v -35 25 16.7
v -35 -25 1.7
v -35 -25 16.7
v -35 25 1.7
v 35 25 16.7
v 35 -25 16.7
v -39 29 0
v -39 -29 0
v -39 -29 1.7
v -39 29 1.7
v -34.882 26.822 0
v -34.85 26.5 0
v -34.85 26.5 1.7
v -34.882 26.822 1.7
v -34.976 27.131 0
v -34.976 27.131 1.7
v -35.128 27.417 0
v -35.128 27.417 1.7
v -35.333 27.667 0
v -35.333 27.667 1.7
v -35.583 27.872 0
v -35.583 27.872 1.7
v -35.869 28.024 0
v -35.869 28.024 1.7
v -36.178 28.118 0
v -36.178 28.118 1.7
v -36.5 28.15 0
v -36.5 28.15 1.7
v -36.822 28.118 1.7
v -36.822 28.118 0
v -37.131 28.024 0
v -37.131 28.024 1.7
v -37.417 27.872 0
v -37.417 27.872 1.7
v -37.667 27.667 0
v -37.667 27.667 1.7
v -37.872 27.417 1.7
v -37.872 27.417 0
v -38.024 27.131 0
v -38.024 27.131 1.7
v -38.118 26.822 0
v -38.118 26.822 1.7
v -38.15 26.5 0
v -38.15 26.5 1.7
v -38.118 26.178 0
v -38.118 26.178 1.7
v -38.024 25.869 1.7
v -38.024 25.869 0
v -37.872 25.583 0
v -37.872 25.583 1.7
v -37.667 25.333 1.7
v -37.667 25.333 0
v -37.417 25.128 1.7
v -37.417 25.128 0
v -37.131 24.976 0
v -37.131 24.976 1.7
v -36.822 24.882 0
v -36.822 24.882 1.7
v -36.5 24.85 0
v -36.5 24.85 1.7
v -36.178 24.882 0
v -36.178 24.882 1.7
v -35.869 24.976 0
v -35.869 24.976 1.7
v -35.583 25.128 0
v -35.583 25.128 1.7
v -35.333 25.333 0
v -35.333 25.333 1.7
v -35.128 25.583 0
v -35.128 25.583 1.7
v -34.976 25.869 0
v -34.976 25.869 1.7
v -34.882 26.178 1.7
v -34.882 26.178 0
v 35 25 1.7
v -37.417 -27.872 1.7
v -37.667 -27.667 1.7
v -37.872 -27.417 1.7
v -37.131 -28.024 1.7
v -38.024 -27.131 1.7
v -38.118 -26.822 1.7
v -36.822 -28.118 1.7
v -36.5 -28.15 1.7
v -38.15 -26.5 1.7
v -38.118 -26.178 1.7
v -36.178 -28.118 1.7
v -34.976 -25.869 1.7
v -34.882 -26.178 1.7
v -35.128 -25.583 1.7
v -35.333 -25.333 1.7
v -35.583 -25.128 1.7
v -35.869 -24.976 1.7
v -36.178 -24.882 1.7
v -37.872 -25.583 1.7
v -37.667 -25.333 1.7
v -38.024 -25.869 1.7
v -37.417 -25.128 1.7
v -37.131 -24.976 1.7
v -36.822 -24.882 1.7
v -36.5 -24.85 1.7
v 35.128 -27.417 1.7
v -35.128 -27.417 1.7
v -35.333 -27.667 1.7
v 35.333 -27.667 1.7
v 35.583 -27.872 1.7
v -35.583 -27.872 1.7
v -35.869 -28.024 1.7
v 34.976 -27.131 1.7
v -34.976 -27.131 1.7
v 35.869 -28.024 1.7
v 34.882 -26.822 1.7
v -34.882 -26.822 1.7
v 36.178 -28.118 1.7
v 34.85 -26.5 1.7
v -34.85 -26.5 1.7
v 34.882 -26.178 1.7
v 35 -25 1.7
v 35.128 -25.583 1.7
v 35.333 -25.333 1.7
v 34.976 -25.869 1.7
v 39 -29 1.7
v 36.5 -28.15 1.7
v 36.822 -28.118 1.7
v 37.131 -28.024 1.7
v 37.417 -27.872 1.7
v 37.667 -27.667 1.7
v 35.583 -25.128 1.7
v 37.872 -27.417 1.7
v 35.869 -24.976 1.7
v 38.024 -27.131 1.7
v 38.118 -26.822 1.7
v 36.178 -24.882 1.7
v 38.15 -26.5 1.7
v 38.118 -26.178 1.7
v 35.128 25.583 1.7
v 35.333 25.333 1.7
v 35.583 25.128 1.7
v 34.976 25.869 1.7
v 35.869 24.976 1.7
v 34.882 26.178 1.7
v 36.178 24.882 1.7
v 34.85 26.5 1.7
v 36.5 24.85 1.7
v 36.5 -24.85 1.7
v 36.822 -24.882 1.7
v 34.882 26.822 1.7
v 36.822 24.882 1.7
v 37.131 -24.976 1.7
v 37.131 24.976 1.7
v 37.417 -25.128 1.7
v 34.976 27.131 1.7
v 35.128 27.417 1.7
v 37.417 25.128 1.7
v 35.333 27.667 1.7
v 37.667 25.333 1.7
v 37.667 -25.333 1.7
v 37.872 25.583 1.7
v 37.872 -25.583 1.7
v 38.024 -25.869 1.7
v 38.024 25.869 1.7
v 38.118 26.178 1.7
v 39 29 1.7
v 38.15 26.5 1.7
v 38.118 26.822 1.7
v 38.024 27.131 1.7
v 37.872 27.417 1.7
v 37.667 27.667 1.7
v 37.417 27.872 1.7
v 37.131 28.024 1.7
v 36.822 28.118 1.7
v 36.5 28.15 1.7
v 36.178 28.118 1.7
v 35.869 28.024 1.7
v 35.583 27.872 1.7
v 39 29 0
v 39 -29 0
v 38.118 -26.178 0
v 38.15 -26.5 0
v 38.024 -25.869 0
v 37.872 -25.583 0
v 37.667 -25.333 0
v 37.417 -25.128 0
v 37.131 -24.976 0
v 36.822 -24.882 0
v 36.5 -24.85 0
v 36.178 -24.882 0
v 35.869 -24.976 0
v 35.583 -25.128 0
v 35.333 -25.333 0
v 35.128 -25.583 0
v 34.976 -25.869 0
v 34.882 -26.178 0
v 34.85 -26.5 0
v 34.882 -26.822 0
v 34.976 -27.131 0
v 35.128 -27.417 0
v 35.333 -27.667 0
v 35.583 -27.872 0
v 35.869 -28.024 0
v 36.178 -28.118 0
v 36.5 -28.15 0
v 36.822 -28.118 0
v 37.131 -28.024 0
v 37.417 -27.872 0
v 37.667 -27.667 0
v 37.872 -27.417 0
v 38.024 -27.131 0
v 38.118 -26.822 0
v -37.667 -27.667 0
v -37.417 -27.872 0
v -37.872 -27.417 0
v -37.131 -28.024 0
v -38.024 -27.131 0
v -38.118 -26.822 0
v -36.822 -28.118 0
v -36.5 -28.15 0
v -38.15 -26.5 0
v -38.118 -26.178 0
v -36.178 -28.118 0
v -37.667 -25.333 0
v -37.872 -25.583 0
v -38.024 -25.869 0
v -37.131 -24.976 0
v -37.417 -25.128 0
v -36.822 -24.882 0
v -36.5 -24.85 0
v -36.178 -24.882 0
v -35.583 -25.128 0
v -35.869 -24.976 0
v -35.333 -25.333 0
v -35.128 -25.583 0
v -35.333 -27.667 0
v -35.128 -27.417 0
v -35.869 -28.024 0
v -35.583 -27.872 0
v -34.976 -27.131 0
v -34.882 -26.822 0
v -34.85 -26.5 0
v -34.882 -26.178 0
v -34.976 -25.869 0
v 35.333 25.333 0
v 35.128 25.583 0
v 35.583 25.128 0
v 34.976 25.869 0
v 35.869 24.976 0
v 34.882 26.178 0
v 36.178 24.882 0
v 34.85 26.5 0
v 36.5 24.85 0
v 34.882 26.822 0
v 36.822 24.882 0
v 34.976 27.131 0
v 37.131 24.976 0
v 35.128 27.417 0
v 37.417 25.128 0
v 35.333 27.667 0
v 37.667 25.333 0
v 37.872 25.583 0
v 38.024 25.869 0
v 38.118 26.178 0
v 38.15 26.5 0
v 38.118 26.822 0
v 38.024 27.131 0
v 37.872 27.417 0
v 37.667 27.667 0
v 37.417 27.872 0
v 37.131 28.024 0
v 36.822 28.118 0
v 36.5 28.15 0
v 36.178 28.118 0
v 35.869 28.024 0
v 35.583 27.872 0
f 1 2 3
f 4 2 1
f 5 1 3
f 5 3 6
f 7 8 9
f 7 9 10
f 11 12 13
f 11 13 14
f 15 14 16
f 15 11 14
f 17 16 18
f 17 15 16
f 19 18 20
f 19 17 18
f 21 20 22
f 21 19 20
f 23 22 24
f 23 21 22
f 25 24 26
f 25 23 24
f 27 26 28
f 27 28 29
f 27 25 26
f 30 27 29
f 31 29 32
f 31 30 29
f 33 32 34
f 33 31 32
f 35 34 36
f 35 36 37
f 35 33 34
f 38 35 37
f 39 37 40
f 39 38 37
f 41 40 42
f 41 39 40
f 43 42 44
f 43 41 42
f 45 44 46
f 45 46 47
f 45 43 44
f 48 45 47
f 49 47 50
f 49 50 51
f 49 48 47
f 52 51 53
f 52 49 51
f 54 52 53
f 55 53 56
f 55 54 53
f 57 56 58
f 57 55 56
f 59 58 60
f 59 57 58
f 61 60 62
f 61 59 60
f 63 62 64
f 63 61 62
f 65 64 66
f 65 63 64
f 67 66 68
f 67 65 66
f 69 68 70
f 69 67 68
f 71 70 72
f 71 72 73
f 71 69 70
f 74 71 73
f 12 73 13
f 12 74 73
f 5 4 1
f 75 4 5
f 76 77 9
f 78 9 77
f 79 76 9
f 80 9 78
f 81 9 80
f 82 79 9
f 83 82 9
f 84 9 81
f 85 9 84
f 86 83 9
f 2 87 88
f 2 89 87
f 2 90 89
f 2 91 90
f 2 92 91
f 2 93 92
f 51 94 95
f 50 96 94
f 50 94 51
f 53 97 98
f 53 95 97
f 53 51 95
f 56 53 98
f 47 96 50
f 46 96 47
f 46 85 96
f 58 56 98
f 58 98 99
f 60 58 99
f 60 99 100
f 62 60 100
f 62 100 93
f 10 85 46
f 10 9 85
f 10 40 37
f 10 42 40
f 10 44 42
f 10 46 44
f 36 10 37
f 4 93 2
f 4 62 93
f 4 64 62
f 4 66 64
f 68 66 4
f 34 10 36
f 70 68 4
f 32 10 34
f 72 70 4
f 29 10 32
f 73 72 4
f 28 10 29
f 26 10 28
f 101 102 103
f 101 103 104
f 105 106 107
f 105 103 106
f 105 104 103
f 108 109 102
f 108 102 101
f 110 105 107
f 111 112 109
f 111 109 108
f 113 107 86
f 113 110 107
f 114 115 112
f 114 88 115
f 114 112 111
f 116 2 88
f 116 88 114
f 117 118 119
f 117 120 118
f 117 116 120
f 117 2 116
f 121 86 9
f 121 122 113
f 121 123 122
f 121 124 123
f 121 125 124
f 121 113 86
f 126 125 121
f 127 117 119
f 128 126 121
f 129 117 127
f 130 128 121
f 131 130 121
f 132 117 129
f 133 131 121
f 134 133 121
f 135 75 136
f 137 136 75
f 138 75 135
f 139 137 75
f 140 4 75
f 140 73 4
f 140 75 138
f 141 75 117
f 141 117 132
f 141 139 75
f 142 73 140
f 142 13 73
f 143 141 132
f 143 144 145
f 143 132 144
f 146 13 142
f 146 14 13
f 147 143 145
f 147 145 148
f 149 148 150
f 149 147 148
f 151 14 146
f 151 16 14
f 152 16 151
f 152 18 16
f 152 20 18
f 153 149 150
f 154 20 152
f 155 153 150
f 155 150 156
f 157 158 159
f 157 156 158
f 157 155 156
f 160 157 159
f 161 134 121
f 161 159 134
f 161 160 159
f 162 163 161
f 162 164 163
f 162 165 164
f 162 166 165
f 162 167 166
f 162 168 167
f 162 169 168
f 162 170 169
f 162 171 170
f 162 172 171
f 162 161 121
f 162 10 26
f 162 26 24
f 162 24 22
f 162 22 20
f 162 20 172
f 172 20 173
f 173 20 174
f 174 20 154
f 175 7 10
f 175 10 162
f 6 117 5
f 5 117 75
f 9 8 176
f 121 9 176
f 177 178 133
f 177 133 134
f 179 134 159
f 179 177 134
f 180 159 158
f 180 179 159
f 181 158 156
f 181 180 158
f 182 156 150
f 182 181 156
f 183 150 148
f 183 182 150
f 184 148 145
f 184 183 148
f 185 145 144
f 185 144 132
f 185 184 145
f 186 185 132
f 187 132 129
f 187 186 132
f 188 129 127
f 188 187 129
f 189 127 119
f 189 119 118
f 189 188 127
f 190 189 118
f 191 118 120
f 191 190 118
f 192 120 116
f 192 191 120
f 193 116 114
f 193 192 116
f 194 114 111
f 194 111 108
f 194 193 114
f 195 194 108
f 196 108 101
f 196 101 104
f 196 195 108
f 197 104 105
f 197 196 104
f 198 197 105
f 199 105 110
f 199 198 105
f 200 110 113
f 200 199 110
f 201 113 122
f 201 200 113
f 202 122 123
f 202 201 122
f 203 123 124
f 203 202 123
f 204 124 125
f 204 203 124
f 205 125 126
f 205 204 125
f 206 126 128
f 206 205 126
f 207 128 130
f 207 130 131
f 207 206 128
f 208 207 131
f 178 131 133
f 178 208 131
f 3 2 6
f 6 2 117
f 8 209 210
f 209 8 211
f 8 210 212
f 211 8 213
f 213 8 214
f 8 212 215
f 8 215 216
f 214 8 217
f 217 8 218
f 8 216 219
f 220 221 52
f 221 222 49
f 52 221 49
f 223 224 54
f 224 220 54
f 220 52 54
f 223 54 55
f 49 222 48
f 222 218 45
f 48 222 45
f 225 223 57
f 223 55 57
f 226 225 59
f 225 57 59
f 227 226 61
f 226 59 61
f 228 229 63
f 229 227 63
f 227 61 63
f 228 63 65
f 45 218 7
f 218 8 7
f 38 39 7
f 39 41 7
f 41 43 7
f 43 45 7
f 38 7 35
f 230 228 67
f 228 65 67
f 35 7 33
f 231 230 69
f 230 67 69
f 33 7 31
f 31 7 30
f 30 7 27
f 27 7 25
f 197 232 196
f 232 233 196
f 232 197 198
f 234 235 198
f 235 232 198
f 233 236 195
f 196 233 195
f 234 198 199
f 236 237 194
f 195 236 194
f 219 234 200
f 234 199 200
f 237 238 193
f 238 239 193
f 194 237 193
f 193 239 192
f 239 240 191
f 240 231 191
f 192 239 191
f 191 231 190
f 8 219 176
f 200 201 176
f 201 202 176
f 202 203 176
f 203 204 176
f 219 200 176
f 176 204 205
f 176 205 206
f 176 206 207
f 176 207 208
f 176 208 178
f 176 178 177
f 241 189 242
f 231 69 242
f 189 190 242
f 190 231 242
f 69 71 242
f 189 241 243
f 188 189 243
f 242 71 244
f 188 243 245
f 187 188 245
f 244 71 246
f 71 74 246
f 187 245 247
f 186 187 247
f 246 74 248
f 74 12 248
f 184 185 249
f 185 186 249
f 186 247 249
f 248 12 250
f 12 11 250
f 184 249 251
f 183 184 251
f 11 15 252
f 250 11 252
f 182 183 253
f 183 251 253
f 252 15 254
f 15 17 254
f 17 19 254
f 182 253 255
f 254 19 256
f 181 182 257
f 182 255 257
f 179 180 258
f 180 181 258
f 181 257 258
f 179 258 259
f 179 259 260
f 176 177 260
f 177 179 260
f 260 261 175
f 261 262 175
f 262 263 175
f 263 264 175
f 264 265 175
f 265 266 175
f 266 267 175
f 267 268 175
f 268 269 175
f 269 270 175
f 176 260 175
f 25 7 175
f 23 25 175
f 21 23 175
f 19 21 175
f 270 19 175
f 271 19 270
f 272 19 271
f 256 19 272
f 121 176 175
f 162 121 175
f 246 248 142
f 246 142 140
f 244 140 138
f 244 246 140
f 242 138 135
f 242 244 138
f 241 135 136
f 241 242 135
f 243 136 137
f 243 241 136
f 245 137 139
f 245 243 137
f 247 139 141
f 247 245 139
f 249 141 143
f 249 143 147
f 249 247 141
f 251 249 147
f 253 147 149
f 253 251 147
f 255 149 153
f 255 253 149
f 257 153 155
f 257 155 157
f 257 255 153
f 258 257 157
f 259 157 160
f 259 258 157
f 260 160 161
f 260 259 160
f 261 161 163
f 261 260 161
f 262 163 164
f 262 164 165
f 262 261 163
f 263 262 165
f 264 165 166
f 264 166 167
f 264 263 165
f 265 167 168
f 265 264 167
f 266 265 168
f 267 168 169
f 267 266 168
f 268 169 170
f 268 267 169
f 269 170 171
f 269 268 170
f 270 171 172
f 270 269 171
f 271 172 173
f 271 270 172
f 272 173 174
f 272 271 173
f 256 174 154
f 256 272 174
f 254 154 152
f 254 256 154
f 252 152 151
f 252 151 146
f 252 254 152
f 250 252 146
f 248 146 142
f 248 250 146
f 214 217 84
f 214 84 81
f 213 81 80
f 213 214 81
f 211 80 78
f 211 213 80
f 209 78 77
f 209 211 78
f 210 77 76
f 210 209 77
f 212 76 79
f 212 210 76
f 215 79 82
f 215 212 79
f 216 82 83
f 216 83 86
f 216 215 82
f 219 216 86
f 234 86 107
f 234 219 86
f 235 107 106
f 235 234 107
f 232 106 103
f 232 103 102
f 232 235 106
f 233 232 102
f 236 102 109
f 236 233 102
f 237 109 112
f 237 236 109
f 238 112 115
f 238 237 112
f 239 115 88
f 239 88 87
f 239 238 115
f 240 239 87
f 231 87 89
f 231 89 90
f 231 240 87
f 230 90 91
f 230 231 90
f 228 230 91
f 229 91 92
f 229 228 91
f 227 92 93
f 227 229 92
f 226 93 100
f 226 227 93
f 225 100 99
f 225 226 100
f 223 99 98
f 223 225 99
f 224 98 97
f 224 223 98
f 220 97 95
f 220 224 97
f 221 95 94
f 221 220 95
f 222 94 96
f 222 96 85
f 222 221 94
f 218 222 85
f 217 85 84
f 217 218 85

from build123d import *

# Parameters (mm, degrees)
ESBO_O1_W                = 78
ESBO_O1_H                = 58
ESBO_O1_R                = 1.65
RESSALTO_EXTRUS_O1_DEPTH = 1.7
ESBO_O2_W                = 70
ESBO_O2_H                = 50
RESSALTO_EXTRUS_O2_DEPTH = 15


with BuildPart() as part:
    # Esboço1 → Ressalto-extrusão1 (new body)
    with BuildSketch(Plane.XY):
        Rectangle(ESBO_O1_W, ESBO_O1_H)
        with Locations((-36.5, 26.5)):
            Circle(ESBO_O1_R, mode=Mode.SUBTRACT)
        with Locations(Location((-36.5, -26.5, 0), (0, 0, 180))):
            Circle(ESBO_O1_R, mode=Mode.SUBTRACT)
        with Locations(Location((36.5, 26.5, 0), (0, 0, 180))):
            Circle(ESBO_O1_R, mode=Mode.SUBTRACT)
        with Locations((36.5, -26.5)):
            Circle(ESBO_O1_R, mode=Mode.SUBTRACT)
    extrude(amount=RESSALTO_EXTRUS_O1_DEPTH)

    # Esboço2 → Ressalto-extrusão2 (add)
    with BuildSketch(Plane.XY.offset(1.7)):
        Rectangle(ESBO_O2_W, ESBO_O2_H)
    extrude(amount=RESSALTO_EXTRUS_O2_DEPTH)


solid = part.part
